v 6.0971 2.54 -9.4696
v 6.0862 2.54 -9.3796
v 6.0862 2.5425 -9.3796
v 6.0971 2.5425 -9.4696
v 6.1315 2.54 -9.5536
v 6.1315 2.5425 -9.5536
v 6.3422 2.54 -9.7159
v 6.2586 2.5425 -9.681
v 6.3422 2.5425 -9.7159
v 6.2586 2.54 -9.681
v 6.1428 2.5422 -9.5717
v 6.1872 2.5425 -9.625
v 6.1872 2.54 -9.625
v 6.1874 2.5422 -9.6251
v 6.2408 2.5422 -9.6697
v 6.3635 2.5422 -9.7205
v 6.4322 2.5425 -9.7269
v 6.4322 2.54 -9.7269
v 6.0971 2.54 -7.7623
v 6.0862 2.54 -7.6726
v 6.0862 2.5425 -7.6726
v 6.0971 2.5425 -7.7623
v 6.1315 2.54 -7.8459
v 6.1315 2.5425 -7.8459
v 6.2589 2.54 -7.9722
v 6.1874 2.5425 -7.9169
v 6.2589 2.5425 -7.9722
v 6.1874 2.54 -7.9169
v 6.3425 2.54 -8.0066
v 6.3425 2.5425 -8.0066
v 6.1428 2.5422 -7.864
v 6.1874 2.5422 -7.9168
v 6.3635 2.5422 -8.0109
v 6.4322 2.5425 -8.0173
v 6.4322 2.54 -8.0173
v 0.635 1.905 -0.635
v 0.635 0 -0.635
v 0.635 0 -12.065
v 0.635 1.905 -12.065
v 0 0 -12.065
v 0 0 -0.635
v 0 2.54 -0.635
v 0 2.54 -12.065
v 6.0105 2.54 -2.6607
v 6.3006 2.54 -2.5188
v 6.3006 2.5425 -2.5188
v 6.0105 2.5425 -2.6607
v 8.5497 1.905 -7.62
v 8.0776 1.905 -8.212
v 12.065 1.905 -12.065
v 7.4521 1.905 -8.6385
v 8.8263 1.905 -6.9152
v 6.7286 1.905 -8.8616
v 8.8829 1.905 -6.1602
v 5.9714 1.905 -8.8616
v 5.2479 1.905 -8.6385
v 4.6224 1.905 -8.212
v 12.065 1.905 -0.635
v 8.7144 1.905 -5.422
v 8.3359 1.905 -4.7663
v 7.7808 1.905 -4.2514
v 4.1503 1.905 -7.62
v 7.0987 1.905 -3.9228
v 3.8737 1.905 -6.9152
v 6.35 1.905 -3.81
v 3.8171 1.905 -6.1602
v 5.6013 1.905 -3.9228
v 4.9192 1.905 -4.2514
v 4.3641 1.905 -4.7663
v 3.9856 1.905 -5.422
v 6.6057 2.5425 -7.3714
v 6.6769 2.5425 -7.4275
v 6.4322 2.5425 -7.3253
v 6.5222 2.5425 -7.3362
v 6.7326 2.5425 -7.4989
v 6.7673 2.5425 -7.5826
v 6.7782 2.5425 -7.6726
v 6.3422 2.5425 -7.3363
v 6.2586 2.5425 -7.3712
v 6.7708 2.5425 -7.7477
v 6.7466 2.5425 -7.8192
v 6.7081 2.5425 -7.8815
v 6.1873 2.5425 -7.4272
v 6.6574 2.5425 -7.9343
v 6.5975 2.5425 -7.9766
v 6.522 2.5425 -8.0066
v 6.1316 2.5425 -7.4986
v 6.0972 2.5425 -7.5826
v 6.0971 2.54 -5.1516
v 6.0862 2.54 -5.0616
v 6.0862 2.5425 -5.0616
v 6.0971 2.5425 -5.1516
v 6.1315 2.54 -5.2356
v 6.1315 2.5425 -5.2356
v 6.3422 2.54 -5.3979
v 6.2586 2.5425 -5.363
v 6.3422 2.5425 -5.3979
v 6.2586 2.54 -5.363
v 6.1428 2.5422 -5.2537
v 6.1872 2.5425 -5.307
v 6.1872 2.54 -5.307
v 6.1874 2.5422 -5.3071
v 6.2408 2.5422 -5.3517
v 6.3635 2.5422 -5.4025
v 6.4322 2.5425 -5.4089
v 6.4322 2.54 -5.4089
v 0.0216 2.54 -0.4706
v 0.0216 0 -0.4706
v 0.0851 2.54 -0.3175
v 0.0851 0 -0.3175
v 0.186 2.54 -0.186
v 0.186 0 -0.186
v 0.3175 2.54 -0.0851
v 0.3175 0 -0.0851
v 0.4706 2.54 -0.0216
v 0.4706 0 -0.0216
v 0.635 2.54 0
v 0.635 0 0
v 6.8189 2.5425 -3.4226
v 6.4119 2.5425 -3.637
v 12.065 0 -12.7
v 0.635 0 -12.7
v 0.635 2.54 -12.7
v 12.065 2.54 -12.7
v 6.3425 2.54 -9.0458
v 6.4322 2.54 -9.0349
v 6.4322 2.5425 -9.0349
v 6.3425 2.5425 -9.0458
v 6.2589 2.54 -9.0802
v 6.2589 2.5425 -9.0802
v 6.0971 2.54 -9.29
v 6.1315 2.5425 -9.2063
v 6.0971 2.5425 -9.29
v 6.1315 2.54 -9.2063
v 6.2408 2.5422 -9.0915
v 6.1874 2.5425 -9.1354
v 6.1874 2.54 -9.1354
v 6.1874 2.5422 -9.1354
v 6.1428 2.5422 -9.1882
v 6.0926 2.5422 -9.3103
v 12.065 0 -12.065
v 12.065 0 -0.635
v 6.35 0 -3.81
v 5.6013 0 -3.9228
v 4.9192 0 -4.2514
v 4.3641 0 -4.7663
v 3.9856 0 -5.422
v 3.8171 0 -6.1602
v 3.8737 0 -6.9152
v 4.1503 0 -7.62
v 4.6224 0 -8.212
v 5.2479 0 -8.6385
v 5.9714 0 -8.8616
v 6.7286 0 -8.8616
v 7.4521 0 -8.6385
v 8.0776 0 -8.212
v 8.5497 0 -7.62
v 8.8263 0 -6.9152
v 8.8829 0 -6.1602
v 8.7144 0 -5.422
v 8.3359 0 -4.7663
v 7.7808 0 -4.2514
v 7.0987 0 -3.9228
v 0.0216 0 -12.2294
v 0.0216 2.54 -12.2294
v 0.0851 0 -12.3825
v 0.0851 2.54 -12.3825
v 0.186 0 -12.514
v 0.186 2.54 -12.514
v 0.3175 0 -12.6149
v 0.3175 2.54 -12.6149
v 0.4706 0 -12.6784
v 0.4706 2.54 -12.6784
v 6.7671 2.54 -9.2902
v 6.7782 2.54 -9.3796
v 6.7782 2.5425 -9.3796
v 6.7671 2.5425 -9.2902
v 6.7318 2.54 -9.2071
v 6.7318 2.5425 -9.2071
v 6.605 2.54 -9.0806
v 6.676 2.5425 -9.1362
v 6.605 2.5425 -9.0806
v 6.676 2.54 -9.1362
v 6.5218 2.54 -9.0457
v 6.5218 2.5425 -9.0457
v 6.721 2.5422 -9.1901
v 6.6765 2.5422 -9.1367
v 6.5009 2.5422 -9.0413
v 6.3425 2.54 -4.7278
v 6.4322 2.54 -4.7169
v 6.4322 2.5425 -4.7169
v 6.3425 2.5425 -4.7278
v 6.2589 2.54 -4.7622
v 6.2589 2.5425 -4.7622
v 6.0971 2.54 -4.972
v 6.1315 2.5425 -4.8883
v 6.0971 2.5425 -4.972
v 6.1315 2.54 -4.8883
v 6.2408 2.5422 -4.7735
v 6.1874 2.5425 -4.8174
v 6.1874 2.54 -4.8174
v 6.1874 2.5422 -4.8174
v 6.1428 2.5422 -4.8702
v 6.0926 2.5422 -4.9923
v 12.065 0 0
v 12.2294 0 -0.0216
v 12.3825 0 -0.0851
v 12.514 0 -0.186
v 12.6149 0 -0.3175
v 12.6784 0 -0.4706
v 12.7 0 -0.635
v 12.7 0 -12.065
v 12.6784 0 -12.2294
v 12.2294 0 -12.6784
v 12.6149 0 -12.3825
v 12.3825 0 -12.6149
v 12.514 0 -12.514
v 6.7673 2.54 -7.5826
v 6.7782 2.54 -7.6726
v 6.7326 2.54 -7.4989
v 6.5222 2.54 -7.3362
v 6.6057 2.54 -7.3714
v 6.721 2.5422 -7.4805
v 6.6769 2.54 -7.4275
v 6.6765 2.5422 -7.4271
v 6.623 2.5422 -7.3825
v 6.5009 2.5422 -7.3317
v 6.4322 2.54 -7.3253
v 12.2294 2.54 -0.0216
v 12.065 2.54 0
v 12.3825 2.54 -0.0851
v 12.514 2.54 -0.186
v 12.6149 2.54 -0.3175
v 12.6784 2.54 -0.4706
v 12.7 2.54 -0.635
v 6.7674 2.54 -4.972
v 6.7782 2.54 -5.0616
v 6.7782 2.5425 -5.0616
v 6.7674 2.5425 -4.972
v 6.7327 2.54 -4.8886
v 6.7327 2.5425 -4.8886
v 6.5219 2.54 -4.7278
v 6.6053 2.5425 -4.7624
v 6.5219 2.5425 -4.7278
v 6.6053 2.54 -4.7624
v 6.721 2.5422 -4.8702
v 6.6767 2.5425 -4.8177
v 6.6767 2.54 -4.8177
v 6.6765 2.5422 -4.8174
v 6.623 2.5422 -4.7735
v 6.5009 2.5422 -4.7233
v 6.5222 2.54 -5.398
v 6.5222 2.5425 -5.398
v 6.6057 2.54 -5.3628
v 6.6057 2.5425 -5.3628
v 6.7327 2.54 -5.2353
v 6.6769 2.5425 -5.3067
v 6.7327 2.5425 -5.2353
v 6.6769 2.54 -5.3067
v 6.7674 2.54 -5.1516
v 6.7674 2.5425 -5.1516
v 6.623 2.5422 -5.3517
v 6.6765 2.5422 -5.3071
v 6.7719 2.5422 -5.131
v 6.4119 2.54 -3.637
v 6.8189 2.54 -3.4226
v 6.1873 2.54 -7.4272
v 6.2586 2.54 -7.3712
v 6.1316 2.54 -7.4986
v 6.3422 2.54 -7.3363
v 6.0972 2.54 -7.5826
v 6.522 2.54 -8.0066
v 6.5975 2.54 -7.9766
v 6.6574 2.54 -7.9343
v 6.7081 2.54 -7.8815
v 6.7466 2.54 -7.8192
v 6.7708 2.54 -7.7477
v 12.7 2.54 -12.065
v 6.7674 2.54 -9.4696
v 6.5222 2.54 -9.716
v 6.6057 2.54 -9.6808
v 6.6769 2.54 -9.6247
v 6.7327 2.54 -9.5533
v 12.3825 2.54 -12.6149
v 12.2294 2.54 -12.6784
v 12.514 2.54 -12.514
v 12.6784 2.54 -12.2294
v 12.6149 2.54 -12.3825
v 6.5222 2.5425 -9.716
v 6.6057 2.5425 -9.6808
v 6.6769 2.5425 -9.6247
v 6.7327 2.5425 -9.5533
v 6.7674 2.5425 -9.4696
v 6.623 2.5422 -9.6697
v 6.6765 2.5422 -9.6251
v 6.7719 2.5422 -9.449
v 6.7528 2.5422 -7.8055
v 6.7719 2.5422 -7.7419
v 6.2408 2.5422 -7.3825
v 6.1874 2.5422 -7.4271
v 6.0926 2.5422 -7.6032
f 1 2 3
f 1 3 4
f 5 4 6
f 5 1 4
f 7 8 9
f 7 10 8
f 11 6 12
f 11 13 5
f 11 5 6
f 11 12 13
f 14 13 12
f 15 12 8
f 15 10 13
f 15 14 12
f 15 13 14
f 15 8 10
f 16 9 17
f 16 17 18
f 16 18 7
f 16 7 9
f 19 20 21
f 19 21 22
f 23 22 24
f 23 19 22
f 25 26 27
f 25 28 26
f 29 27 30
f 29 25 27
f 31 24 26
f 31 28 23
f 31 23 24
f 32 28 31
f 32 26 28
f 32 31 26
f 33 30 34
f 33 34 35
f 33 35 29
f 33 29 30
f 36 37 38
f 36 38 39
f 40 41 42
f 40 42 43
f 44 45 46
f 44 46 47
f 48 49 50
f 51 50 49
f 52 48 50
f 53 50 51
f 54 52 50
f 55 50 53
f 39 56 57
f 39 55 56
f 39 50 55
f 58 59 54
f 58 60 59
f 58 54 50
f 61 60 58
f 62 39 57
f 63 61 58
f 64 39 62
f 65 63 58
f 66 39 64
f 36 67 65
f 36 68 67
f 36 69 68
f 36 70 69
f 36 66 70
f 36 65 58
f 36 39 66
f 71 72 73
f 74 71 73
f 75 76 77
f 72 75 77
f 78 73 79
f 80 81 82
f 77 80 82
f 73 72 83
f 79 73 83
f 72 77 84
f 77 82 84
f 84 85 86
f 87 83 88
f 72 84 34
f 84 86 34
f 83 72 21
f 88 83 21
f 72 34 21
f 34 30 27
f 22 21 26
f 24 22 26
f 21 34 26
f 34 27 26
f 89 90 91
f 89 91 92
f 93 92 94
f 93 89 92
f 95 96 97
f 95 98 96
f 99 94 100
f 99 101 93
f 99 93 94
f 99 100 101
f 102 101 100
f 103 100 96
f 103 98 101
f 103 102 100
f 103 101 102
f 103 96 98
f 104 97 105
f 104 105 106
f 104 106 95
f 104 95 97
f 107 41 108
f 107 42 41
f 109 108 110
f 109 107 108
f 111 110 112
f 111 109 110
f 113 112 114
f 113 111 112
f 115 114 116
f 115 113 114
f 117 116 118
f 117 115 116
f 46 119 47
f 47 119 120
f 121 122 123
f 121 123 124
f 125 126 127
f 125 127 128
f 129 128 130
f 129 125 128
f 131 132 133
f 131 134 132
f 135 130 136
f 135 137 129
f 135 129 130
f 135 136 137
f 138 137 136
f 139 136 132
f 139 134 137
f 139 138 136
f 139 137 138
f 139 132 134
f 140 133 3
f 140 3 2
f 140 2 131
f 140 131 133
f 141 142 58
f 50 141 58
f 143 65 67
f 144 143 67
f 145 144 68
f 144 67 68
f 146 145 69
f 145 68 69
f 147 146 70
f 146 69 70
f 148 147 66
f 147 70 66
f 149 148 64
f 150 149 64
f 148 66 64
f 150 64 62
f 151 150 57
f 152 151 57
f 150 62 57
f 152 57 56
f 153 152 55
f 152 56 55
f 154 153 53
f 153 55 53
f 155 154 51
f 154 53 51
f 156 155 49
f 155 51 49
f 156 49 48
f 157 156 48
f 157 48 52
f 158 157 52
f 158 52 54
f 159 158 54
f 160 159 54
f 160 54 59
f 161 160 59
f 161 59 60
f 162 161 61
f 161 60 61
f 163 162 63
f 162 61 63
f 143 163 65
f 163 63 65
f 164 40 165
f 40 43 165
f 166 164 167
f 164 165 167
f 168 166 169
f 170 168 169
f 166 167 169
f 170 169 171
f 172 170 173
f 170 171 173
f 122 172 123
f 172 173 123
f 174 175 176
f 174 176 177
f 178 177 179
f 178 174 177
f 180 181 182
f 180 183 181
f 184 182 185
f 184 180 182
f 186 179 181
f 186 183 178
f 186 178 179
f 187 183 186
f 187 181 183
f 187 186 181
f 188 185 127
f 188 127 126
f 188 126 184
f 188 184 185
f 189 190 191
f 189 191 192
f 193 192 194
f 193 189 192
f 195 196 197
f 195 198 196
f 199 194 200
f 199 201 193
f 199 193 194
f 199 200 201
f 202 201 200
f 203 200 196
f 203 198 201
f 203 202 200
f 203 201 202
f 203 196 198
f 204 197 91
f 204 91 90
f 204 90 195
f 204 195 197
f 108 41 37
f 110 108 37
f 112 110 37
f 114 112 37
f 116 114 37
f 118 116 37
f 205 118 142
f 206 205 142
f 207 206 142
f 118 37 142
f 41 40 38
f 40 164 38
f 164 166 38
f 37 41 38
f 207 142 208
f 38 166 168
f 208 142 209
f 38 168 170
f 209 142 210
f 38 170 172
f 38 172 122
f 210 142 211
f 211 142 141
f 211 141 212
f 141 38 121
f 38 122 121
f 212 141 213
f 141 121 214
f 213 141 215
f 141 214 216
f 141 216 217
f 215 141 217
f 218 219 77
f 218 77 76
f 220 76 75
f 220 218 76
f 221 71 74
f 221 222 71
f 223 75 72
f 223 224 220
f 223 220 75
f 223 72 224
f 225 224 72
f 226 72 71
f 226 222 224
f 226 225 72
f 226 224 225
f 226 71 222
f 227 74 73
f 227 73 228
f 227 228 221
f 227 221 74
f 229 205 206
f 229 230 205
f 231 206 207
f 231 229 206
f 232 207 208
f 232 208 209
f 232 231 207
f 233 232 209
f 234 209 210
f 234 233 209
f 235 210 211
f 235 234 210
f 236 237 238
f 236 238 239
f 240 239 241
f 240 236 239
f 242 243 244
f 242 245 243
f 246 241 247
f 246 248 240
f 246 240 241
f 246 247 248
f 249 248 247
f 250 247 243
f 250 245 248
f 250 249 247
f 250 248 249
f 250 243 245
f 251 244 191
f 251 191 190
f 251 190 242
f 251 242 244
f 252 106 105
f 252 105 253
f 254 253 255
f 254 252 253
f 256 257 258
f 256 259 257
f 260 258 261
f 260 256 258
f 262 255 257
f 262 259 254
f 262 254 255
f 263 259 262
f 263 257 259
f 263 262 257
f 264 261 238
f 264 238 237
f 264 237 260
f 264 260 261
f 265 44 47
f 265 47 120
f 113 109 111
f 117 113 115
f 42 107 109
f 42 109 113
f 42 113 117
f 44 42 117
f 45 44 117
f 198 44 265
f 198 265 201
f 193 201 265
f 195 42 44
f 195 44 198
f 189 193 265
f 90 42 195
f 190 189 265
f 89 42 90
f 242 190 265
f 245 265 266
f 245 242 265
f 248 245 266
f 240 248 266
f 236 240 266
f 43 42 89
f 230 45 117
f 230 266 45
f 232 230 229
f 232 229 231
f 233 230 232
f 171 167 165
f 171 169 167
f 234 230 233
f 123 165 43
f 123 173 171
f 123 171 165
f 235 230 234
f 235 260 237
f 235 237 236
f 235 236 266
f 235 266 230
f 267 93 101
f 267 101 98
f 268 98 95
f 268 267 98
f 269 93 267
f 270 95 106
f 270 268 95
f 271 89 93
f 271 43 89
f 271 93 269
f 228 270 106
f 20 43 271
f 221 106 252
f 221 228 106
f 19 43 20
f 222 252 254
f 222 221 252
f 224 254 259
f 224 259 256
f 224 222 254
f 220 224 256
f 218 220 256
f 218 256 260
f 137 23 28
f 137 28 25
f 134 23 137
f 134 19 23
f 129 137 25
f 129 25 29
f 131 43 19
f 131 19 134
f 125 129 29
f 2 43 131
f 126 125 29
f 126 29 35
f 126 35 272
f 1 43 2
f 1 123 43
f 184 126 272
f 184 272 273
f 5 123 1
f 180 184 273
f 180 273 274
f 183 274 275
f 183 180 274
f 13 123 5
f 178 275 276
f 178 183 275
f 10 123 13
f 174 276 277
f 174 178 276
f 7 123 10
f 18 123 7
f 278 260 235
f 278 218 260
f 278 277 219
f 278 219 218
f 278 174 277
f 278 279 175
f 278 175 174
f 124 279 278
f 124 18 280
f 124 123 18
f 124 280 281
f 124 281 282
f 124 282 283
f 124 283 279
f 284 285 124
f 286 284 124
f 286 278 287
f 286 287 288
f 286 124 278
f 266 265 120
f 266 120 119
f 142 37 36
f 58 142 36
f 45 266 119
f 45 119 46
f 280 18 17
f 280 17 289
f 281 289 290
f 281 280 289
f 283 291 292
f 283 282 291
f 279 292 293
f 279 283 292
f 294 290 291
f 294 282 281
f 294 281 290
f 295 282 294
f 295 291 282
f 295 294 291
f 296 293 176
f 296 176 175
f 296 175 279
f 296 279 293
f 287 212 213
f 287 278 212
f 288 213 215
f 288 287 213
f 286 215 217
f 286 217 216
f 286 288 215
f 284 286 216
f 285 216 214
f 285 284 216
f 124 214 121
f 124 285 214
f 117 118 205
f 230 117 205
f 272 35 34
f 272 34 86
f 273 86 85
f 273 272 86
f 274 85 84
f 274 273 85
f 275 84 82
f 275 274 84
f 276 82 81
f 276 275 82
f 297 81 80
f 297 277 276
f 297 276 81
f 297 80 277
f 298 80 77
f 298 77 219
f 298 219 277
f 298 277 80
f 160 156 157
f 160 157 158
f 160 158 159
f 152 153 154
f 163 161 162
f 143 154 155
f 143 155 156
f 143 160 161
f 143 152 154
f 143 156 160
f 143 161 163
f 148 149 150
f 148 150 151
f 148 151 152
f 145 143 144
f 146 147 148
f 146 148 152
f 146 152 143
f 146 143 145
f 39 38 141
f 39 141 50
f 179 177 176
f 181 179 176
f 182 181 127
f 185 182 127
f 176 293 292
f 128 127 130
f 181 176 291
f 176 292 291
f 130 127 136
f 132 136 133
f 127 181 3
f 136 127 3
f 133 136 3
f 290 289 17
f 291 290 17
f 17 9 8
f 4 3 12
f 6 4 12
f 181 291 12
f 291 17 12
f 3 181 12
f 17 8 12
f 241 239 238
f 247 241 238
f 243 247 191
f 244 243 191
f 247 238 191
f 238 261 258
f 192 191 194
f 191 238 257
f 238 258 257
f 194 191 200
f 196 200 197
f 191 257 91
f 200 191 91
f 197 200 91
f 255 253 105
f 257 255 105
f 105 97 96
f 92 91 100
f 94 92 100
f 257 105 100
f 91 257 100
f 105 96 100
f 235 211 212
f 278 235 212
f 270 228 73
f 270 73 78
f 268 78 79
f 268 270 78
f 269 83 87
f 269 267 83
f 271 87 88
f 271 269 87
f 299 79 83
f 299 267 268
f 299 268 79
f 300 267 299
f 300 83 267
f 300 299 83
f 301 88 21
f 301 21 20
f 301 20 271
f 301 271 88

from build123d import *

# Parameters (mm, degrees)
SKETCH1_W           = 12.7
SKETCH1_H           = 12.7
BOSS_EXTRUDE1_DEPTH = 2.54
FILLET1_R           = 0.635
SHELL1_START        = 0.635
SHELL1_OUTLINE_W    = 1.905
SHELL1_OUTLINE_H    = 11.43
SHELL1_DEPTH        = 11.43
SKETCH2_R           = 2.54
BOSS_EXTRUDE2_DEPTH = 1.905
BOSS_EXTRUDE3_DEPTH = 0.00254


# Read off the part's stored shape, not the designer's step: Shell1
with BuildPart() as part:
    # Sketch1 → Boss-Extrude1 (new body)
    with BuildSketch(Plane(origin=(0, 0, 0), x_dir=(1, 0, 0), z_dir=(0, 1, 0))):
        with Locations((6.35, 6.35)):
            Rectangle(SKETCH1_W, SKETCH1_H)
    extrude(amount=BOSS_EXTRUDE1_DEPTH)

    # Fillet1
    fillet1_edges = [part.edges().sort_by_distance(p)[0] for p in [
        (0, 1.27, -12.7),
        (12.7, 1.27, -12.7),
        (12.7, 1.27, 0),
        (0, 1.27, 0),
    ]]
    fillet(fillet1_edges, radius=FILLET1_R)

    # Shell1 outline → Shell1 (cut)
    with BuildSketch(Plane.YZ.offset(SHELL1_START)):
        with Locations((0.9525, -6.35)):
            Rectangle(SHELL1_OUTLINE_W, SHELL1_OUTLINE_H)
    extrude(amount=SHELL1_DEPTH, mode=Mode.SUBTRACT)

    # Sketch2 → Boss-Extrude2 (add)
    with BuildSketch(Plane(origin=(0, 1.905, 0), x_dir=(-1, 0, 0), z_dir=(0, -1, 0))):
        with Locations(Location((-6.35, 6.35, 0), (0, 0, 270))):
            Circle(SKETCH2_R)
    extrude(amount=BOSS_EXTRUDE2_DEPTH)

    # Sketch3 → Boss-Extrude3 (add)
    with BuildSketch(Plane(origin=(0, 2.54, 0), x_dir=(1, 0, 0), z_dir=(0, 1, 0))):
        with BuildLine():
            add(Edge.make_bspline(
                [(6.432224359, 9.726897436), (6.455251183, 9.725706594), (6.500646544, 9.723358955), (6.565830657, 9.703776202), (6.625237948, 9.670782167), (6.67786071, 9.626551956), (6.722312309, 9.573817503), (6.754934047, 9.513997076), (6.774770917, 9.4485002), (6.777054423, 9.402877937), (6.778217949, 9.379631811)],
                knots=[0, 0, 0, 0, 1.013817282, 1.998651736, 2.969187861, 3.991244904, 5.013301947, 5.9920405, 6.976874954, 8, 8, 8, 8], degree=3))
            add(Edge.make_bspline(
                [(6.778217949, 9.379631811), (6.777069623, 9.356799998), (6.774815935, 9.311990578), (6.754640219, 9.247480223), (6.72234006, 9.18798217), (6.677853125, 9.135257928), (6.625239865, 9.091024972), (6.565830149, 9.058031637), (6.500646676, 9.038448699), (6.455251227, 9.036101085), (6.432224359, 9.034910256)],
                knots=[0, 0, 0, 0, 1.009116963, 1.980479832, 2.963706907, 3.990451133, 5.017195359, 5.992182391, 6.981533323, 8, 8, 8, 8], degree=3))
            add(Edge.make_bspline(
                [(6.432224359, 9.034910256), (6.409185604, 9.036078537), (6.363766721, 9.0383817), (6.298671705, 9.058314456), (6.238667642, 9.090077481), (6.186076647, 9.134036199), (6.141182927, 9.18595953), (6.109829566, 9.245948014), (6.089538882, 9.310915397), (6.087350713, 9.356368241), (6.086230769, 9.379631811)],
                knots=[0, 0, 0, 0, 1.016706445, 2.004347467, 2.981433789, 4.000427929, 5.018214116, 5.995300439, 6.973959266, 8, 8, 8, 8], degree=3))
            add(Edge.make_bspline(
                [(6.086230769, 9.379631811), (6.087378792, 9.402886411), (6.089631872, 9.448525304), (6.109660198, 9.513804333), (6.141367354, 9.574006456), (6.186018885, 9.626497828), (6.238654577, 9.671002499), (6.29850054, 9.703611102), (6.363785957, 9.723387734), (6.409192077, 9.72571628), (6.432224359, 9.726897436)],
                knots=[0, 0, 0, 0, 1.022642663, 2.007012786, 2.980863166, 4.002438329, 5.024013493, 6.00229059, 6.986660713, 8, 8, 8, 8], degree=3))
        make_face()
        with BuildLine():
            add(Edge.make_bspline(
                [(6.432224359, 8.017282051), (6.455229408, 8.01602074), (6.500522375, 8.013537435), (6.565964538, 7.995004793), (6.625026467, 7.96170826), (6.677835723, 7.918278705), (6.722489899, 7.866027151), (6.754764929, 7.806440642), (6.774863399, 7.741250637), (6.777082284, 7.695815172), (6.778217949, 7.672560497)],
                knots=[0, 0, 0, 0, 1.016957001, 2.002212695, 2.9757545, 3.99499976, 5.013036768, 5.994806404, 6.97370641, 8, 8, 8, 8], degree=3))
            add(Edge.make_bspline(
                [(6.778217949, 7.672560497), (6.777089724, 7.649302087), (6.774885374, 7.603859325), (6.754625849, 7.538542292), (6.722538129, 7.478466037), (6.67783214, 7.425654573), (6.625245168, 7.381406547), (6.565828744, 7.348417057), (6.500647041, 7.328833105), (6.45525135, 7.32648563), (6.432224359, 7.325294872)],
                knots=[0, 0, 0, 0, 1.023218912, 1.999186227, 2.986238111, 4.008388923, 5.030539734, 6.0011649, 6.986089706, 8, 8, 8, 8], degree=3))
            add(Edge.make_bspline(
                [(6.432224359, 7.325294872), (6.409191911, 7.326475947), (6.363785464, 7.328804333), (6.298502441, 7.348582131), (6.238647359, 7.381186296), (6.186047174, 7.425708246), (6.141141459, 7.478279027), (6.109966022, 7.538731843), (6.089517785, 7.603834699), (6.087343571, 7.64929375), (6.086230769, 7.672560497)],
                knots=[0, 0, 0, 0, 1.013427518, 1.99788335, 2.976245624, 3.997909735, 5.019573847, 6.001765691, 6.977268297, 8, 8, 8, 8], degree=3))
            add(Edge.make_bspline(
                [(6.086230769, 7.672560497), (6.087350912, 7.695823654), (6.089539471, 7.741275691), (6.109827339, 7.806248907), (6.141191423, 7.866215177), (6.186043429, 7.91822492), (6.238867187, 7.961926791), (6.298365885, 7.994841981), (6.363910067, 8.01356642), (6.409213828, 8.016030503), (6.432224359, 8.017282051)],
                knots=[0, 0, 0, 0, 1.025808215, 2.00424526, 2.981110158, 3.998665696, 5.017428914, 5.998734231, 6.983523959, 8, 8, 8, 8], degree=3))
        make_face()
        with BuildLine():
            add(Edge.make_bspline(
                [(6.432224359, 5.408897436), (6.455251183, 5.407706594), (6.500646544, 5.405358955), (6.565830657, 5.385776202), (6.625237948, 5.352782167), (6.67786071, 5.308551956), (6.722312309, 5.255817503), (6.754934047, 5.195997076), (6.774770917, 5.1305002), (6.777054423, 5.084877937), (6.778217949, 5.061631811)],
                knots=[0, 0, 0, 0, 1.013817282, 1.998651736, 2.969187861, 3.991244904, 5.013301947, 5.9920405, 6.976874954, 8, 8, 8, 8], degree=3))
            add(Edge.make_bspline(
                [(6.778217949, 5.061631811), (6.777082486, 5.038376721), (6.774863996, 4.992940445), (6.754762665, 4.92775631), (6.722498561, 4.868147384), (6.677802035, 4.815982727), (6.625228174, 4.772296035), (6.56565729, 4.740149638), (6.500666175, 4.720410262), (6.45525779, 4.718088149), (6.432224359, 4.716910256)],
                knots=[0, 0, 0, 0, 1.02653117, 2.005657786, 2.987654694, 4.005927372, 5.02540858, 5.994694477, 6.98280758, 8, 8, 8, 8], degree=3))
            add(Edge.make_bspline(
                [(6.432224359, 4.716910256), (6.409185604, 4.718078537), (6.363766721, 4.7203817), (6.298671705, 4.740314456), (6.238667642, 4.772077481), (6.186076647, 4.816036199), (6.141182927, 4.86795953), (6.109829566, 4.927948014), (6.089538882, 4.992915397), (6.087350713, 5.038368241), (6.086230769, 5.061631811)],
                knots=[0, 0, 0, 0, 1.016706445, 2.004347467, 2.981433789, 4.000427929, 5.018214116, 5.995300439, 6.973959266, 8, 8, 8, 8], degree=3))
            add(Edge.make_bspline(
                [(6.086230769, 5.061631811), (6.087378792, 5.084886411), (6.089631872, 5.130525304), (6.109660198, 5.195804333), (6.141367354, 5.256006456), (6.186018885, 5.308497828), (6.238654577, 5.353002499), (6.29850054, 5.385611102), (6.363785957, 5.405387734), (6.409192077, 5.40771628), (6.432224359, 5.408897436)],
                knots=[0, 0, 0, 0, 1.022642663, 2.007012786, 2.980863166, 4.002438329, 5.024013493, 6.00229059, 6.986660713, 8, 8, 8, 8], degree=3))
        make_face()
        Polygon((6.411871795, 3.636952324), (6.818923077, 3.422614383), (6.30056871, 2.518833333), (6.010544671, 2.660665264), align=None)
    extrude(amount=BOSS_EXTRUDE3_DEPTH)


solid = part.part
